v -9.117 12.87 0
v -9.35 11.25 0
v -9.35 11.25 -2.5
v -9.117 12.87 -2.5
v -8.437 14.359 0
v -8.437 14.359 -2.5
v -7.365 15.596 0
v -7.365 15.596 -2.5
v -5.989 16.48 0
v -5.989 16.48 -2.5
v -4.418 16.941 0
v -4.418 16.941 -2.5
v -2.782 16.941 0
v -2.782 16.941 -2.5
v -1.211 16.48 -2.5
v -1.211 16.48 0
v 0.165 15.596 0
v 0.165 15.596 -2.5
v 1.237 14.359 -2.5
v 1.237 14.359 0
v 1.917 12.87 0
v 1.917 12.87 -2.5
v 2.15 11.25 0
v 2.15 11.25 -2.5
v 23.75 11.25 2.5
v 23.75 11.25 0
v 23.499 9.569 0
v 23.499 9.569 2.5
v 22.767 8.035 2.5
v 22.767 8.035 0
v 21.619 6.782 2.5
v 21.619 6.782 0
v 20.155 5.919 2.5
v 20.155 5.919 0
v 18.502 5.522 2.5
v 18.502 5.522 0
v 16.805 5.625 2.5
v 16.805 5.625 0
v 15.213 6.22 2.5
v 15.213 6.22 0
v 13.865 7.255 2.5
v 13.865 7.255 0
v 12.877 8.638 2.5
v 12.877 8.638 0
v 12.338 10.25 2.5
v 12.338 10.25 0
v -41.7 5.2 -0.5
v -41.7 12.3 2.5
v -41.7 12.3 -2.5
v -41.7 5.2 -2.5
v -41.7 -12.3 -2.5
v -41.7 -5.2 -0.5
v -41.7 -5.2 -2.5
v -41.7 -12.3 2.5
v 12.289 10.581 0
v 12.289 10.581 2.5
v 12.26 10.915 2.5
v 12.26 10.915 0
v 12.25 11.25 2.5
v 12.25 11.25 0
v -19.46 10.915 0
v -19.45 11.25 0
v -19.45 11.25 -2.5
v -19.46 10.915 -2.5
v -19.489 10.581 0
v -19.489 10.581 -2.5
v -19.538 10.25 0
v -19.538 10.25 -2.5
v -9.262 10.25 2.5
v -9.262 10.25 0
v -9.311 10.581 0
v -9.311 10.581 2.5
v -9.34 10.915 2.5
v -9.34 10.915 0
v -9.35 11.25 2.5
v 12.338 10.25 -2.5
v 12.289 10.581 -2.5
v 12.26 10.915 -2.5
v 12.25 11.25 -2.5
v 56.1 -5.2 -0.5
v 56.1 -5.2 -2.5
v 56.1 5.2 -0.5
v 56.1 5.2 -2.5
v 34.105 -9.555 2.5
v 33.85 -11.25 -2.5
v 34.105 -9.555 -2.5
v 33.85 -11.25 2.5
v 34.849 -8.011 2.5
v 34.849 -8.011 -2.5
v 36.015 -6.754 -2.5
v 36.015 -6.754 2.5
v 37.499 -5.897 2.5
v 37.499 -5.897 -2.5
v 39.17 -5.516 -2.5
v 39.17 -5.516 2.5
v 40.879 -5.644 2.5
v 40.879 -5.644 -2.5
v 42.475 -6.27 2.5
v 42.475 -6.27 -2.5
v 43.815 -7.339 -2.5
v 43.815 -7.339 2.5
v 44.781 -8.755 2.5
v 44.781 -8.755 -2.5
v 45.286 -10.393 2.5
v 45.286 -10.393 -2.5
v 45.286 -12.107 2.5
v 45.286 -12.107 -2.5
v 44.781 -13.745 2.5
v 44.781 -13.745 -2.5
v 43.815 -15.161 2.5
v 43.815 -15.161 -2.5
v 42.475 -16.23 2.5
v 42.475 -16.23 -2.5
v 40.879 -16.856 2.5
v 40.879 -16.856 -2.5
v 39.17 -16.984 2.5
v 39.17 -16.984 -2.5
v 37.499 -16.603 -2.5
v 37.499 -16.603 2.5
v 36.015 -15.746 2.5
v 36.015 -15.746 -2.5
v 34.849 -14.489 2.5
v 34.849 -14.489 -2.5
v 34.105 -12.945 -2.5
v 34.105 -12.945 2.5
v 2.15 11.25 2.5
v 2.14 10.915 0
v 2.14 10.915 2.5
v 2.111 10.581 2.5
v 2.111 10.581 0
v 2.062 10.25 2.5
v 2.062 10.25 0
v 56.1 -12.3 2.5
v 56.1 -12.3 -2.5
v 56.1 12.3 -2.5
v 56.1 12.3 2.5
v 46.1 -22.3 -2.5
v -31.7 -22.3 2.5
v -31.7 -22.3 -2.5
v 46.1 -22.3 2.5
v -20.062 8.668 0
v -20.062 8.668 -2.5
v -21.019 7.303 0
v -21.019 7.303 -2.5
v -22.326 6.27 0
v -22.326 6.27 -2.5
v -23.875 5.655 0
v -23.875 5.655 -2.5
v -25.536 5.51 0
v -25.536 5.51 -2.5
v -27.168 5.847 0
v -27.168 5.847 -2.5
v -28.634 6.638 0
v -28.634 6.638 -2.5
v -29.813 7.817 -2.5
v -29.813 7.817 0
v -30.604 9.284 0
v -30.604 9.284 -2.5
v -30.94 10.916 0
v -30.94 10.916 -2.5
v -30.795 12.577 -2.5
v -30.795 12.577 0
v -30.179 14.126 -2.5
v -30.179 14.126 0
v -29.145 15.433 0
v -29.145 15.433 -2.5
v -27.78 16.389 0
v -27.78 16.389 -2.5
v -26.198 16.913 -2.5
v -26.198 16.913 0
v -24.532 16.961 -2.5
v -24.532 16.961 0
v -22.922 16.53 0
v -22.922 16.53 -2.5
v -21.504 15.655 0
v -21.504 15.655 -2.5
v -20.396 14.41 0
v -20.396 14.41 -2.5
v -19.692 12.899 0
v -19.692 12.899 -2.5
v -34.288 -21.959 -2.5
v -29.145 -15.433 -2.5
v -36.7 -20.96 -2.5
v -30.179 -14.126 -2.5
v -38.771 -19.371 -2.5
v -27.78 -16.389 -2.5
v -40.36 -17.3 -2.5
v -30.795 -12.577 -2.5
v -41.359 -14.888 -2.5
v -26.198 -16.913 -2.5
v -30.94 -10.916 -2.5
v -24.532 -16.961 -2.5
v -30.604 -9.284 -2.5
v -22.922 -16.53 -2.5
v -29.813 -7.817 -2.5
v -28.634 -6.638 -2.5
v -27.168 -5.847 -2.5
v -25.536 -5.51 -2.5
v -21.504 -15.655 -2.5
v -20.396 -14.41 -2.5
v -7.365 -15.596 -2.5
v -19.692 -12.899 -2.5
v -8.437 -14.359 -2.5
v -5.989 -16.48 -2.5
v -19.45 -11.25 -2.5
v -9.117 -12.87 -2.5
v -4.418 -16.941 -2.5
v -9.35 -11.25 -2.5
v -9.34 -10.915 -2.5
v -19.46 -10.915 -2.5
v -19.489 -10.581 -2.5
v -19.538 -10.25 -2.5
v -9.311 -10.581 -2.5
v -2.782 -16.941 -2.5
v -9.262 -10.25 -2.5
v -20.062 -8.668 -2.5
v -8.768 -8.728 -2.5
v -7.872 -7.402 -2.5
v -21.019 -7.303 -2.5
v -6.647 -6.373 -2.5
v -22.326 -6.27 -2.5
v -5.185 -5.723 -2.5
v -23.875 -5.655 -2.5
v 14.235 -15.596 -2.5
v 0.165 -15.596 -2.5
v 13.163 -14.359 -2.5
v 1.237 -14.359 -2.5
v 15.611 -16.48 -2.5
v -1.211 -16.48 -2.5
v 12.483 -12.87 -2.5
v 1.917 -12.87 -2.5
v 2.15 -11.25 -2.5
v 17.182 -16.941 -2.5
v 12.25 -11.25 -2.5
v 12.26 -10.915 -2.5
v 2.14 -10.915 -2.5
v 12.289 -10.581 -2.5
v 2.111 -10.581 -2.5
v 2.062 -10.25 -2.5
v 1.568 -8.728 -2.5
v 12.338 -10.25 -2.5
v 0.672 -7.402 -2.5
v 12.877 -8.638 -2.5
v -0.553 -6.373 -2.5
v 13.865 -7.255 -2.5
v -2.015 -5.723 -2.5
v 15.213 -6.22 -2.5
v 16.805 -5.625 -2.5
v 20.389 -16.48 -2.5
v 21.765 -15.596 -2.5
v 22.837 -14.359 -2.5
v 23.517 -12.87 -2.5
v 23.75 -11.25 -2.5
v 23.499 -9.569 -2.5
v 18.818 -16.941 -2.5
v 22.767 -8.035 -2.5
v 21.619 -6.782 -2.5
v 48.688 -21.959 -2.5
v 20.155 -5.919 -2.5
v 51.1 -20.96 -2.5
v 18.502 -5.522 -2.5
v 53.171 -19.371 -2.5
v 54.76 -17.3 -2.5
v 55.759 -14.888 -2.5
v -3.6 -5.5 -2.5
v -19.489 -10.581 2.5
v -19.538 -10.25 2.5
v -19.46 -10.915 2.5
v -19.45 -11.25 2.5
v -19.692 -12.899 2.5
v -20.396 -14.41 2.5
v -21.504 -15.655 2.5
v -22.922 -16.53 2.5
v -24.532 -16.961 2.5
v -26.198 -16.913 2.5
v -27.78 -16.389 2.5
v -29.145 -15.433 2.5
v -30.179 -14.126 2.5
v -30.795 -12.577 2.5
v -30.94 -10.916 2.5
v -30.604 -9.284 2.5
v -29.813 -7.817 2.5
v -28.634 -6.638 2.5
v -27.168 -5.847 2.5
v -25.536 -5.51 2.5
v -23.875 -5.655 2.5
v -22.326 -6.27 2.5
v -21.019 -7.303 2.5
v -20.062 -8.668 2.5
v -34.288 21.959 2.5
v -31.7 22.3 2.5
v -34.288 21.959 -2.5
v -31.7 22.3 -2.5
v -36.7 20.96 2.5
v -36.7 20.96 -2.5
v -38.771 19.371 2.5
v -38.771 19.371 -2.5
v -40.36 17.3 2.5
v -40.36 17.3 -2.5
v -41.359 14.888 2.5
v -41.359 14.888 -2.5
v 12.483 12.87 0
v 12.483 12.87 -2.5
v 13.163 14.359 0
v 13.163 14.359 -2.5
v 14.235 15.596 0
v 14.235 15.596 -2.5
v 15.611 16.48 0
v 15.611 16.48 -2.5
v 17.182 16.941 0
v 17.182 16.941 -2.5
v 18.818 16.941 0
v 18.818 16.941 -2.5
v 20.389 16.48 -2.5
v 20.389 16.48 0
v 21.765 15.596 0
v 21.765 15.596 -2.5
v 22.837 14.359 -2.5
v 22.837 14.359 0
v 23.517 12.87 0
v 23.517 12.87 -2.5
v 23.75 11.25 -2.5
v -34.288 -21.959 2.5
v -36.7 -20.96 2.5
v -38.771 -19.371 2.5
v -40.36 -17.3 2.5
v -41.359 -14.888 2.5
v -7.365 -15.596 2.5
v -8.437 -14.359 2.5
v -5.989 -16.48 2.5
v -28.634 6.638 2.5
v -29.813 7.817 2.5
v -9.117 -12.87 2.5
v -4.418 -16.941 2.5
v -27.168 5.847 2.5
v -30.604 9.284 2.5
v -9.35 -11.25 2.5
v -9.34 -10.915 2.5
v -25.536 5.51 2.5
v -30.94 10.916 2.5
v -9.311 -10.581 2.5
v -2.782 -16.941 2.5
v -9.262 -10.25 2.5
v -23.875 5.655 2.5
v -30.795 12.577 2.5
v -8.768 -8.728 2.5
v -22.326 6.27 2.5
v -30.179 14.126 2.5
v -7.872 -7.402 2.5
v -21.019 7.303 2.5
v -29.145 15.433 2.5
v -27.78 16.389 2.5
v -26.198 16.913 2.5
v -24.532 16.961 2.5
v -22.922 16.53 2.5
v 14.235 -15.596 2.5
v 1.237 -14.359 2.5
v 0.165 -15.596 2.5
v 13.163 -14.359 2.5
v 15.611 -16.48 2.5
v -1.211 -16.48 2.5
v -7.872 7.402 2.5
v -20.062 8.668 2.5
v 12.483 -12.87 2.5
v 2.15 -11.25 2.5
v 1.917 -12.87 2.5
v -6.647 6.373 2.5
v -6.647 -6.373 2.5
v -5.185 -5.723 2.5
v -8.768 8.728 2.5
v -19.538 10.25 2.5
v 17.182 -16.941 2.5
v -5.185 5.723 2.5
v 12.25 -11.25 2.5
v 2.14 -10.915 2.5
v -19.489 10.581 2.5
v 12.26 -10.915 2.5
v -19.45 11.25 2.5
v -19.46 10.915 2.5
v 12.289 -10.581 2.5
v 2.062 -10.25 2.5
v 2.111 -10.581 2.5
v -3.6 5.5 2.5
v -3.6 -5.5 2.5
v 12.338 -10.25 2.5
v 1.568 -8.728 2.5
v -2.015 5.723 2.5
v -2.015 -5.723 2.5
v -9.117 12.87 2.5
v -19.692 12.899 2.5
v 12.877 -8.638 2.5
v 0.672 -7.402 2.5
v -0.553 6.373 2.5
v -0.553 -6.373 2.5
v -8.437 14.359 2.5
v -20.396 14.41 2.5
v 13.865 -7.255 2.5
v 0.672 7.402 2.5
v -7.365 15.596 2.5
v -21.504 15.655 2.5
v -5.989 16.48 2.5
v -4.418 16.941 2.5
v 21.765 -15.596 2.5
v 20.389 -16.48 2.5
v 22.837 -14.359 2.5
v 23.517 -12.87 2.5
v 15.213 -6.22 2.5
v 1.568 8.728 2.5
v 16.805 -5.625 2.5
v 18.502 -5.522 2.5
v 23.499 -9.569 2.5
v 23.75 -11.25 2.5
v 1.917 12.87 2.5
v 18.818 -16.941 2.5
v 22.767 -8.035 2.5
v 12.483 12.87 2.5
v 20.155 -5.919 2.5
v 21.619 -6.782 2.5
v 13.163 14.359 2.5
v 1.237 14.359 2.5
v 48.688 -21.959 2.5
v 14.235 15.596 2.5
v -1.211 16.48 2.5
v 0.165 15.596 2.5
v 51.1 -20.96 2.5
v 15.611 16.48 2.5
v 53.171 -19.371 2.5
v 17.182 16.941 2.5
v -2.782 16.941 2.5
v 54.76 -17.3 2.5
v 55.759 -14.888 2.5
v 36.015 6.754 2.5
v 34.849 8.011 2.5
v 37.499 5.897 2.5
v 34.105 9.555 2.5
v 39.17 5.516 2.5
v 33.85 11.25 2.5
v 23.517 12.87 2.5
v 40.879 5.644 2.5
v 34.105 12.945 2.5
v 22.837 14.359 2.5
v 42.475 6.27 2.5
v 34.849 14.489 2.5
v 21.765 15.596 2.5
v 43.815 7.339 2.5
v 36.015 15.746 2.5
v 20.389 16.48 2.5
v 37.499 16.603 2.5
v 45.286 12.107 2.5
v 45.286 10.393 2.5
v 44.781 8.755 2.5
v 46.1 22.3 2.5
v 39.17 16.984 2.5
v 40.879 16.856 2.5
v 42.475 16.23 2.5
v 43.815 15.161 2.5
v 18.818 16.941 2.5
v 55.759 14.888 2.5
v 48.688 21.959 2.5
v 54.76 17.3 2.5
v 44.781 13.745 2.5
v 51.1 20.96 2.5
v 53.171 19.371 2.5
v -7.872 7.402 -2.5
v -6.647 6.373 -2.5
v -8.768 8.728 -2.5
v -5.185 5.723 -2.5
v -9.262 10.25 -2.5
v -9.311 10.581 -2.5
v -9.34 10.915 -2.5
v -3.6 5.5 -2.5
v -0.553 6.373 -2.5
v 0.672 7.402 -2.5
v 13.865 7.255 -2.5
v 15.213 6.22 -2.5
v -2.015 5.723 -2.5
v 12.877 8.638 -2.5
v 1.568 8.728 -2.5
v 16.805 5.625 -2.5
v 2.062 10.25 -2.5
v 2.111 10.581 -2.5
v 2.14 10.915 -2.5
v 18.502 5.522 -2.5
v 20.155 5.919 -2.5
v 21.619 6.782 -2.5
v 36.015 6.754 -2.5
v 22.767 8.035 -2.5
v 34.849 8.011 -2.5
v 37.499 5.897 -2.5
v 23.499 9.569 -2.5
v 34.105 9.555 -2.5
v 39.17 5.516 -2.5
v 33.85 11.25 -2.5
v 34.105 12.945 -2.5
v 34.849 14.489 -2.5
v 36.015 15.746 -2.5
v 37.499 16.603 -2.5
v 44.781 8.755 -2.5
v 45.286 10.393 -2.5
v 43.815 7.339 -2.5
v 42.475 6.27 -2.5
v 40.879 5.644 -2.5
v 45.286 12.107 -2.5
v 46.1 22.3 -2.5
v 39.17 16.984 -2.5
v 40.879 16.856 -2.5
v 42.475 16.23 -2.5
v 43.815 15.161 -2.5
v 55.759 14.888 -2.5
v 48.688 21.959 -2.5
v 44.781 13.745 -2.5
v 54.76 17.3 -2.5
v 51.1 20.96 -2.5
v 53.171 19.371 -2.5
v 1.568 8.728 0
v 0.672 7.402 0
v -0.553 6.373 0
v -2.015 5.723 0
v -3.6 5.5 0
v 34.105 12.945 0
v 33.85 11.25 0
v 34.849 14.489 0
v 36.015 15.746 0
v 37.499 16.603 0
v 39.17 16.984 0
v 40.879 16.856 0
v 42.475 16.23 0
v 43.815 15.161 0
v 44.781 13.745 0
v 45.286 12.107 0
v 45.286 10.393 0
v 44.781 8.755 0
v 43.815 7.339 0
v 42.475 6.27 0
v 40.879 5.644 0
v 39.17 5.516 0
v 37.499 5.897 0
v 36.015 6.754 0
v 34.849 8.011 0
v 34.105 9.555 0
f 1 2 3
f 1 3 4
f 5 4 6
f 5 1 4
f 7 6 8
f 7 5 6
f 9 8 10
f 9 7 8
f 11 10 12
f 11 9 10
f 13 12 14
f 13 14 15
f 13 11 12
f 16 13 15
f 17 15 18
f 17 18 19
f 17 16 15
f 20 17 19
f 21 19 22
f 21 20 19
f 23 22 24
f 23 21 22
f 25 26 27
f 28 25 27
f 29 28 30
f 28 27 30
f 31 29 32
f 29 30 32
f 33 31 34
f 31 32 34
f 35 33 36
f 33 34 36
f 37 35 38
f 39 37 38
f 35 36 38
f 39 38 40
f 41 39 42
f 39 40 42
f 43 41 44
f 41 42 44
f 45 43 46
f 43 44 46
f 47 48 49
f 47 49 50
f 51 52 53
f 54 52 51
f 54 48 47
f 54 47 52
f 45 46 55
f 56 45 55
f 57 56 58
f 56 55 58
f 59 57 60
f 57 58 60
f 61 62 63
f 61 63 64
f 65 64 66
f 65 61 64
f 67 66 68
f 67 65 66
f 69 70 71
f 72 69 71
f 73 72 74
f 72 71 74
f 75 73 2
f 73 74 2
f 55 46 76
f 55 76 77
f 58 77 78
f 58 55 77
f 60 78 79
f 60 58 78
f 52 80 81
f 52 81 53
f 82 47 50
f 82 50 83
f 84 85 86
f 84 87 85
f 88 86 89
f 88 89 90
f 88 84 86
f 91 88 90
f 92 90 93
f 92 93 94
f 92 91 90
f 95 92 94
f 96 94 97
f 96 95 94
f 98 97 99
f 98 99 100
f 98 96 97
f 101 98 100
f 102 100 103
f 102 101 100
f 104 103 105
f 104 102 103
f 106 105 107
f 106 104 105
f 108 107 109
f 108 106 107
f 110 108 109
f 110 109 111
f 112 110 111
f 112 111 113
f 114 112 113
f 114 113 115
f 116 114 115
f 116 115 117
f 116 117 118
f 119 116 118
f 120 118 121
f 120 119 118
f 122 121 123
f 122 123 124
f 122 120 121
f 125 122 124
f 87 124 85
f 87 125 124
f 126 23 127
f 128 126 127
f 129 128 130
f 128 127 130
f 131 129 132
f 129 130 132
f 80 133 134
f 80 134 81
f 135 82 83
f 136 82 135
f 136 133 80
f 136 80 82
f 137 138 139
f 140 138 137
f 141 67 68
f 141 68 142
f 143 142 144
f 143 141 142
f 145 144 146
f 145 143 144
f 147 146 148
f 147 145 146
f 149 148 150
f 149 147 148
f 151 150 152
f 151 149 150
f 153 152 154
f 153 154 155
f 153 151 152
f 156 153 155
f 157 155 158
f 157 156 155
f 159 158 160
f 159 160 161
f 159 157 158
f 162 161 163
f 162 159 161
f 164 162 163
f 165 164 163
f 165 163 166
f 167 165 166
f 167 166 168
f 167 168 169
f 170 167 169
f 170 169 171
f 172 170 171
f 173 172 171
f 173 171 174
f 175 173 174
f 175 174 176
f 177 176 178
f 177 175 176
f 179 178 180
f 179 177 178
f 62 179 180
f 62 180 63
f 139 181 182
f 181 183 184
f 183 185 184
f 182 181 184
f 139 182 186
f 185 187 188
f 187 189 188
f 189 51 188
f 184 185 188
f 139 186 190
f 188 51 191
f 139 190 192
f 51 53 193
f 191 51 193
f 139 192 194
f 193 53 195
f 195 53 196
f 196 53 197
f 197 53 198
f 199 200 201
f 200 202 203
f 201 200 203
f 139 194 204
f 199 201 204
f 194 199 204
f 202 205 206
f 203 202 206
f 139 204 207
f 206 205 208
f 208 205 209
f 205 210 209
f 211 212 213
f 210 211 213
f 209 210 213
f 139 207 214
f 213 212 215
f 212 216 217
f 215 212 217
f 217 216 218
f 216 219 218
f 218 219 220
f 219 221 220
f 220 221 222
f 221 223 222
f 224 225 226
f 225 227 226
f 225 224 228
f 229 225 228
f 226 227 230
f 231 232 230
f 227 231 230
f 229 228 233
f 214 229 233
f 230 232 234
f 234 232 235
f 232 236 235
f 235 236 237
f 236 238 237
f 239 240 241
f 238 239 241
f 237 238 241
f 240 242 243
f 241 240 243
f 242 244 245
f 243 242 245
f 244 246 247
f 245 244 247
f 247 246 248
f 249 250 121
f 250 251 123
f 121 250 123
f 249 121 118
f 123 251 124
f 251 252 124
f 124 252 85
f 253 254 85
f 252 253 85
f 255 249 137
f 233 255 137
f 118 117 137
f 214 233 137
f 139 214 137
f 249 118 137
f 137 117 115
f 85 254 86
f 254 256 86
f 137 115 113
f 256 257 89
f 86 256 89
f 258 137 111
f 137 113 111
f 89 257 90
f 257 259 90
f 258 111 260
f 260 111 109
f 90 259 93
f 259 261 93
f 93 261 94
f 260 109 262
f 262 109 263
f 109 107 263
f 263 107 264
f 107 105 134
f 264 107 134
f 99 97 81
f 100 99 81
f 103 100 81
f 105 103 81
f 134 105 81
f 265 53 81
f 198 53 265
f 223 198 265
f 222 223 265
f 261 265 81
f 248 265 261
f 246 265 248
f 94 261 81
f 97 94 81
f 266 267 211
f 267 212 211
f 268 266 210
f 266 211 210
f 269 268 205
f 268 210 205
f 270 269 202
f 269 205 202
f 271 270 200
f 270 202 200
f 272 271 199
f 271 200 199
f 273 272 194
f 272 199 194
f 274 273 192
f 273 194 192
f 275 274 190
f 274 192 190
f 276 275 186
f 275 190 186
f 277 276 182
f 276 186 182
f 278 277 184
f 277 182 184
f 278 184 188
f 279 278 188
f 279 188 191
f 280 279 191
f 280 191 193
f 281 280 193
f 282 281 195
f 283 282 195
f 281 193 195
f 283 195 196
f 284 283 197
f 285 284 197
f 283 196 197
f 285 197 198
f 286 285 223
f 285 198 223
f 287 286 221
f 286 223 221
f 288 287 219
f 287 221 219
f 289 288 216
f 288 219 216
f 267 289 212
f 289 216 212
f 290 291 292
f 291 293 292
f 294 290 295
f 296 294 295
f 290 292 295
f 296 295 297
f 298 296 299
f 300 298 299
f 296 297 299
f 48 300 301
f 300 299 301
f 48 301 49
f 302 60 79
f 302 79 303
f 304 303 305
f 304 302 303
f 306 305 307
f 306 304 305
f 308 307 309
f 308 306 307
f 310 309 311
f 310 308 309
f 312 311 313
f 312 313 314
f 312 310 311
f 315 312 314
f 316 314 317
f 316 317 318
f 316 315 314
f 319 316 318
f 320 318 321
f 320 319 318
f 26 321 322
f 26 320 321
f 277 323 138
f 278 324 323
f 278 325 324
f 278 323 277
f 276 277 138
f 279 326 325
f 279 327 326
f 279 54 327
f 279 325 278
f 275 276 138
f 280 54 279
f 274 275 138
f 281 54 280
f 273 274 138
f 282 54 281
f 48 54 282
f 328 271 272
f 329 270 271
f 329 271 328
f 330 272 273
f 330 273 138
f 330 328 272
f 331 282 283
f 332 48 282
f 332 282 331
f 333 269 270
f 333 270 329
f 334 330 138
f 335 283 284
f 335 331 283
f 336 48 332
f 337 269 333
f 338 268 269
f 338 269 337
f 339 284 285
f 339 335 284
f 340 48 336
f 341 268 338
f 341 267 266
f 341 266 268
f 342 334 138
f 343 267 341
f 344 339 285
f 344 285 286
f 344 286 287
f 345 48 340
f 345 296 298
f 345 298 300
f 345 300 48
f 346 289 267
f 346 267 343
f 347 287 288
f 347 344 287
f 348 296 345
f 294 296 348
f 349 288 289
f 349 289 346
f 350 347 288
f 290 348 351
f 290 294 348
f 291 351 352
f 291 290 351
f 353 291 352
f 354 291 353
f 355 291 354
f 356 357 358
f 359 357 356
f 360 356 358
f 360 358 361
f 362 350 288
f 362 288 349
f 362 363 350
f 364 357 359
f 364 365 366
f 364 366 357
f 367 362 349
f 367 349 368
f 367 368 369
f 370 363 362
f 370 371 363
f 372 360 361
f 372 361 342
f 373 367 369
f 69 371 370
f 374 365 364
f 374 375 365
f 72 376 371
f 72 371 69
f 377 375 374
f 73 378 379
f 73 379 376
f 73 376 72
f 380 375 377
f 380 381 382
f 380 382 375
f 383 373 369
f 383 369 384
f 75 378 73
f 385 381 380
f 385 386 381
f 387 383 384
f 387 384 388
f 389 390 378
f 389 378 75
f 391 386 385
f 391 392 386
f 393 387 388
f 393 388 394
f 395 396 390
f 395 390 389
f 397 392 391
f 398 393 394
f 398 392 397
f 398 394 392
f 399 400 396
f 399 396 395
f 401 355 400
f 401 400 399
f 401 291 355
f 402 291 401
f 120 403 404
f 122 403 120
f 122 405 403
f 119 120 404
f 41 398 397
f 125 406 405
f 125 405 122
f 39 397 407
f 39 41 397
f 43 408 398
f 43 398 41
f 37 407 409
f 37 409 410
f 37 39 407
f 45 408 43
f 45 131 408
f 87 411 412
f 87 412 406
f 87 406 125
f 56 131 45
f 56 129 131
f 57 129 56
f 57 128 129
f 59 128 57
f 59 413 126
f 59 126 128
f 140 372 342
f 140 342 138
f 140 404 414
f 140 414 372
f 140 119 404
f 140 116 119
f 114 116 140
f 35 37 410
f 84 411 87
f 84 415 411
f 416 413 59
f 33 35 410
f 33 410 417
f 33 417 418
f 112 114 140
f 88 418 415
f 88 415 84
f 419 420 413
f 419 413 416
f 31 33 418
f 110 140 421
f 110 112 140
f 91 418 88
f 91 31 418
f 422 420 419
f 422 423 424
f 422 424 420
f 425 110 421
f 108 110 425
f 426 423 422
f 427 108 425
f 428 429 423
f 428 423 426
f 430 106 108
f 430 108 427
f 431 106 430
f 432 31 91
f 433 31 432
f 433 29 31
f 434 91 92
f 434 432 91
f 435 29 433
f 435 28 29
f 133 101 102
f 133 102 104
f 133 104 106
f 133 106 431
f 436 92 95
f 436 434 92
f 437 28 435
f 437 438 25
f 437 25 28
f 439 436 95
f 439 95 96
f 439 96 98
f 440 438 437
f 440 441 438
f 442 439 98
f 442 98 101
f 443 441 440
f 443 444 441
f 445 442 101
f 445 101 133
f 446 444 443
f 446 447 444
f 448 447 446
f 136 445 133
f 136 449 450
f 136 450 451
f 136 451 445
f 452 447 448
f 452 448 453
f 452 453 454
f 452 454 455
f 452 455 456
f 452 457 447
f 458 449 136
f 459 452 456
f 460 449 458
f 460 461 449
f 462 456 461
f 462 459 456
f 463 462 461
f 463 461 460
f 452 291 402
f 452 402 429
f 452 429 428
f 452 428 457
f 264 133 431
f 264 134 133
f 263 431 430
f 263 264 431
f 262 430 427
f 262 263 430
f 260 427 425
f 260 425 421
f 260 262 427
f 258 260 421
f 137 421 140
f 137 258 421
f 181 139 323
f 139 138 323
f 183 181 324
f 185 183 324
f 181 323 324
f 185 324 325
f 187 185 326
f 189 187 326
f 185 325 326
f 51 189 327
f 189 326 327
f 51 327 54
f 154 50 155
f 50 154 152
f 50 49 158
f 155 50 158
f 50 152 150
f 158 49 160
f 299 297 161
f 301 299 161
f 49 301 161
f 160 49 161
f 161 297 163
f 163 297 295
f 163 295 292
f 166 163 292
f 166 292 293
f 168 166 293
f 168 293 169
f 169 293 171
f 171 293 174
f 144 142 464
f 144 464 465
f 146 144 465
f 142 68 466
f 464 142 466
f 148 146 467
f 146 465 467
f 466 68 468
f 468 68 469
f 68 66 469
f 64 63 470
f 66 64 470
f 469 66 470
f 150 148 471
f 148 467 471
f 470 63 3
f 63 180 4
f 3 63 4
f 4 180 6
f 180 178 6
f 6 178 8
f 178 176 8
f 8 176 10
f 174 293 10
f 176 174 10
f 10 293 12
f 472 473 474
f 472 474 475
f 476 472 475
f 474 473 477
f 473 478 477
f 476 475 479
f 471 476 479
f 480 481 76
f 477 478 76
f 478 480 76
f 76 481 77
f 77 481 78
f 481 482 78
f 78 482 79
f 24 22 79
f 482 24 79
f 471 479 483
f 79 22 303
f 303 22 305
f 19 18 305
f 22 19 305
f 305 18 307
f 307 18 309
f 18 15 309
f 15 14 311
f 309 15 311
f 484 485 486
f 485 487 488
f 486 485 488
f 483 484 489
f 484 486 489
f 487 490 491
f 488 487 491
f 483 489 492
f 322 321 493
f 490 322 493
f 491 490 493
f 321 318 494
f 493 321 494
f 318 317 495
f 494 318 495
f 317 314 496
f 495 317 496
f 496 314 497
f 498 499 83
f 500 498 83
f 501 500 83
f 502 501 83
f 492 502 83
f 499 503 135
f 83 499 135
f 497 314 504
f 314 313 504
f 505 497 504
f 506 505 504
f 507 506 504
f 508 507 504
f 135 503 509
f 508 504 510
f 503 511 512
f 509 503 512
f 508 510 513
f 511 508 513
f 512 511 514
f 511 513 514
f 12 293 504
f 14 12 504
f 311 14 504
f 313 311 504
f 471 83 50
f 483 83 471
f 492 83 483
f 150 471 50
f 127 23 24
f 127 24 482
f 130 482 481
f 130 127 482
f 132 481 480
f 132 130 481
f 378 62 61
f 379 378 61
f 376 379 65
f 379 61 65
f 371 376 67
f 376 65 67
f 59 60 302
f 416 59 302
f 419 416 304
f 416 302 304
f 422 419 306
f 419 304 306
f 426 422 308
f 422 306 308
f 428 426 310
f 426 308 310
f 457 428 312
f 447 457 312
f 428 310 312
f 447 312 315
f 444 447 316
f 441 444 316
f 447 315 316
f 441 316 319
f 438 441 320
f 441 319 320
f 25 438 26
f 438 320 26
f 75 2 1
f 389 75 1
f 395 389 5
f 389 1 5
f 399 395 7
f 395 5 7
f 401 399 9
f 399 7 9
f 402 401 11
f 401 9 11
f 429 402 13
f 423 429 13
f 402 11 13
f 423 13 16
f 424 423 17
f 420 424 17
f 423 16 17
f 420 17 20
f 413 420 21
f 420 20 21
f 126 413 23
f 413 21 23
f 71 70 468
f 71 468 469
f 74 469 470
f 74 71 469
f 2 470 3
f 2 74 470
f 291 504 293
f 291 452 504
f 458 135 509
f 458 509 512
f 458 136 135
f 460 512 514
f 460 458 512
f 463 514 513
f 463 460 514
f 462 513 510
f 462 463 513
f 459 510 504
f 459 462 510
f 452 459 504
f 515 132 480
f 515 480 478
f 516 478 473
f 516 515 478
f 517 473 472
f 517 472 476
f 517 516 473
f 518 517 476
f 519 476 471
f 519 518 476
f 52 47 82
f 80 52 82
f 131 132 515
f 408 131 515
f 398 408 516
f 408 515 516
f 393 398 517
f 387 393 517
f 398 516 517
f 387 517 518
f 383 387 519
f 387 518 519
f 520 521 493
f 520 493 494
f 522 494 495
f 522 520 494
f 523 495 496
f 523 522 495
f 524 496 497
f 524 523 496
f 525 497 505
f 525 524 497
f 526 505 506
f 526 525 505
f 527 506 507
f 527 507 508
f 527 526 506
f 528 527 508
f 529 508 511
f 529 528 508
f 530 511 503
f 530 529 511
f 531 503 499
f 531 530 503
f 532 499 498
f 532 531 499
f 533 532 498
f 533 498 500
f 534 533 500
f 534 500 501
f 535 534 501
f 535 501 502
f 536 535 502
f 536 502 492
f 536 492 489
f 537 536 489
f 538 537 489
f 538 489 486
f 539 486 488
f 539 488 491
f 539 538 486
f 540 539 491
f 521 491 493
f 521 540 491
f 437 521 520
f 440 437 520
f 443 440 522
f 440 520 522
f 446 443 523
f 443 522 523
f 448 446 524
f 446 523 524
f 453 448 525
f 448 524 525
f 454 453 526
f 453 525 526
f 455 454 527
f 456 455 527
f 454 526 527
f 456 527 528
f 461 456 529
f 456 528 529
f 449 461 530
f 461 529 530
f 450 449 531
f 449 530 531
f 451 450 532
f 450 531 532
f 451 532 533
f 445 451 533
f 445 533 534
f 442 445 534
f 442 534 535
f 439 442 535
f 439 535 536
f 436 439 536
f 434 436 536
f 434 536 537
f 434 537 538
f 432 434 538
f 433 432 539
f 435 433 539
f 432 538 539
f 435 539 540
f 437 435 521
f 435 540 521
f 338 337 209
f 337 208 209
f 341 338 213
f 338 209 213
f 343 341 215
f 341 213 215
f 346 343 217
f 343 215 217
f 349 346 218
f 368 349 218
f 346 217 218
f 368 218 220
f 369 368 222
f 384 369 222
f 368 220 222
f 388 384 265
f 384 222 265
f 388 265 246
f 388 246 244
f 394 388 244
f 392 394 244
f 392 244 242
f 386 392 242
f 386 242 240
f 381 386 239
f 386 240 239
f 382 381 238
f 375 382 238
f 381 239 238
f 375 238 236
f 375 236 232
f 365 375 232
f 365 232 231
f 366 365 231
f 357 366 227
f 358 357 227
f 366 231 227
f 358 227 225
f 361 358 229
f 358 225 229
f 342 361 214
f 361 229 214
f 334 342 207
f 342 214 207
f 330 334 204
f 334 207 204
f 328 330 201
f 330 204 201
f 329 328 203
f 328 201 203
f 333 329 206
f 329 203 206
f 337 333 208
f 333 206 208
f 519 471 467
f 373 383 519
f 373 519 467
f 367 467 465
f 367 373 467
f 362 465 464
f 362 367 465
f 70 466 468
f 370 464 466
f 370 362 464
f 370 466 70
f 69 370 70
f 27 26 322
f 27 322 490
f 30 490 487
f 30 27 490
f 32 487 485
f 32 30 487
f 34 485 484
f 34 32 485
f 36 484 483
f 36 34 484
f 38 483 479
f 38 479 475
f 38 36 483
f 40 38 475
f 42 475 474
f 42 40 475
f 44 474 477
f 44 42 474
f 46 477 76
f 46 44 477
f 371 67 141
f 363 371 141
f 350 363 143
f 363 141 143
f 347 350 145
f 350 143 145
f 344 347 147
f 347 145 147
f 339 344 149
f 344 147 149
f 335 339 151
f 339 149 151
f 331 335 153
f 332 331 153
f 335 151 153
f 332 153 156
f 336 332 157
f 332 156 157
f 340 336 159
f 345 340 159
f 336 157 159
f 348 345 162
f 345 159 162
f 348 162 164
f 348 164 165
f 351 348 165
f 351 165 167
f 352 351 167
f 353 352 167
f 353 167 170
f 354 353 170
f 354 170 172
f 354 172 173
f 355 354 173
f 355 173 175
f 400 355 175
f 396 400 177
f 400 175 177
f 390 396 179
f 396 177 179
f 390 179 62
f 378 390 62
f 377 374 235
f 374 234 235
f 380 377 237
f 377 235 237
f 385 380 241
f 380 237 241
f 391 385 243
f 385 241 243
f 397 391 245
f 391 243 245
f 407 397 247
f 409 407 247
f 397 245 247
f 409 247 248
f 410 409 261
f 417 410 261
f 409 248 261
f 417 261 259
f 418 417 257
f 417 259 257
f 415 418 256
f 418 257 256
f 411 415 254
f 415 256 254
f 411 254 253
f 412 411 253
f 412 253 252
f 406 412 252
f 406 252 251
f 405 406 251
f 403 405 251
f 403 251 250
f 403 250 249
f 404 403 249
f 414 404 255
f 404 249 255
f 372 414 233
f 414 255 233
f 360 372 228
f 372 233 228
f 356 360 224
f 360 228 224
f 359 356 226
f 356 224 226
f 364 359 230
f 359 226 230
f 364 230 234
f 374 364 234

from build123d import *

# Parameters (mm, degrees)
F1_DEPTH = 2.5
F2_DEPTH = 2.5
F3_DEPTH = 0.5
F4_R     = 10


# Not quite as in the source:
# - a feature names something its author has since deleted; it is built from what else it names


with BuildPart() as f1:
    # F0 (on Top) → F1 (new body, symmetric)
    with BuildSketch(Plane.XY):
        with BuildLine():
            Line((-41.7, 5.2), (-3.6, 5.2))
            Line((-3.6, 5.2), (-3.6, 5.5))
            ThreePointArc((-3.6, 5.5), (-7.2954363748, 6.8447474533), (-9.2623758265, 10.25))
            Line((-9.2623758265, 10.25), (-19.5376241735, 10.25))
            ThreePointArc((-19.5376241735, 10.25), (-30.9280520686, 11.7519158285), (-19.45, 11.25))
            Line((-19.45, 11.25), (-9.35, 11.25))
            ThreePointArc((-9.35, 11.25), (-3.6, 17), (2.15, 11.25))
            Line((2.15, 11.25), (7.2, 11.25))
            Line((7.2, 11.25), (12.25, 11.25))
            ThreePointArc((12.25, 11.25), (18, 17), (23.75, 11.25))
            ThreePointArc((23.75, 11.25), (18.5019158285, 5.5219479314), (12.3376241735, 10.25))
            Line((12.3376241735, 10.25), (7.2, 10.25))
            Line((7.2, 10.25), (7.2, 5.2))
            Line((7.2, 5.2), (56.1, 5.2))
            Line((56.1, 5.2), (56.1, 22.3))
            Line((56.1, 22.3), (-41.7, 22.3))
            Line((-41.7, 22.3), (-41.7, 5.2))
        make_face()
        with BuildLine():
            ThreePointArc((45.35, 11.25), (39.6, 5.5), (33.85, 11.25))
            ThreePointArc((33.85, 11.25), (39.6, 17), (45.35, 11.25))
        make_face(mode=Mode.SUBTRACT)
        with BuildLine():
            Line((-3.6, 5.5), (-3.6, 5.2))
            Line((-3.6, 5.2), (7.2, 5.2))
            Line((7.2, 5.2), (7.2, 10.25))
            Line((7.2, 10.25), (2.0623758265, 10.25))
            ThreePointArc((2.0623758265, 10.25), (0.0954363748, 6.8447474533), (-3.6, 5.5))
        make_face()
        with BuildLine():
            Line((-19.5376241735, 10.25), (-9.2623758265, 10.25))
            ThreePointArc((-9.2623758265, 10.25), (-9.3280520686, 10.7480841715), (-9.35, 11.25))
            Line((-9.35, 11.25), (-19.45, 11.25))
            ThreePointArc((-19.45, 11.25), (-19.4719479314, 10.7480841715), (-19.5376241735, 10.25))
        make_face()
        with BuildLine():
            ThreePointArc((2.15, 11.25), (2.1280520686, 10.7480841715), (2.0623758265, 10.25))
            Line((2.0623758265, 10.25), (7.2, 10.25))
            Line((7.2, 10.25), (7.2, 11.25))
            Line((7.2, 11.25), (2.15, 11.25))
        make_face()
        with BuildLine():
            Line((7.2, 11.25), (7.2, 10.25))
            Line((7.2, 10.25), (12.3376241735, 10.25))
            ThreePointArc((12.3376241735, 10.25), (12.2719479314, 10.7480841715), (12.25, 11.25))
            Line((12.25, 11.25), (7.2, 11.25))
        make_face()
    extrude(amount=F1_DEPTH, both=True)



with BuildPart() as f1b:
    # F0 (on Top) → F1, piece 2 (new body, symmetric)
    with BuildSketch(Plane.XY):
        Polygon((56.1, -5.2), (-3.6, -5.2), (-41.7, -5.2), (-41.7, -22.3), (56.1, -22.3), align=None)
        with BuildLine():
            ThreePointArc((-9.2623758265, -10.25), (-7.2954363748, -6.8447474533), (-3.6, -5.5))
            ThreePointArc((-3.6, -5.5), (0.0954363748, -6.8447474533), (2.0623758265, -10.25))
            Line((2.0623758265, -10.25), (12.3376241735, -10.25))
            ThreePointArc((12.3376241735, -10.25), (18.5019158285, -5.5219479314), (23.75, -11.25))
            ThreePointArc((23.75, -11.25), (18, -17), (12.25, -11.25))
            Line((12.25, -11.25), (2.15, -11.25))
            ThreePointArc((2.15, -11.25), (-3.6, -17), (-9.35, -11.25))
            Line((-9.35, -11.25), (-19.45, -11.25))
            ThreePointArc((-19.45, -11.25), (-30.9280520686, -11.7519158285), (-19.5376241735, -10.25))
            Line((-19.5376241735, -10.25), (-9.2623758265, -10.25))
        make_face(mode=Mode.SUBTRACT)
        with BuildLine():
            ThreePointArc((45.35, -11.25), (39.6, -17), (33.85, -11.25))
            ThreePointArc((33.85, -11.25), (39.6, -5.5), (45.35, -11.25))
        make_face(mode=Mode.SUBTRACT)
        with BuildLine():
            Line((12.3376241735, -10.25), (2.0623758265, -10.25))
            ThreePointArc((2.0623758265, -10.25), (2.1280520686, -10.7480841715), (2.15, -11.25))
            Line((2.15, -11.25), (12.25, -11.25))
            ThreePointArc((12.25, -11.25), (12.2719479314, -10.7480841715), (12.3376241735, -10.25))
        make_face()
        with BuildLine():
            ThreePointArc((-9.35, -11.25), (-9.3280520686, -10.7480841715), (-9.2623758265, -10.25))
            Line((-9.2623758265, -10.25), (-19.5376241735, -10.25))
            ThreePointArc((-19.5376241735, -10.25), (-19.4719479314, -10.7480841715), (-19.45, -11.25))
            Line((-19.45, -11.25), (-9.35, -11.25))
        make_face()
    extrude(amount=F1_DEPTH, both=True)


with BuildPart() as f1_1:
    add(f1.part)

    add(f1b.part)  # F2 merges F1b
    # F0 (on Top) → F2 (join)
    with BuildSketch(Plane.XY):
        Polygon((-3.6, -5.2), (-3.6, 0), (-3.6, 5.2), (-41.7, 5.2), (-41.7, -5.2), align=None)
        Polygon((-3.6, 5.2), (-3.6, 0), (-3.6, -5.2), (56.1, -5.2), (56.1, 0), (56.1, 5.2), (7.2, 5.2), align=None)
    extrude(amount=F2_DEPTH)

    # F0 (on Top) → F3 (join)
    with BuildSketch(Plane.XY):
        Polygon((-3.6, 5.2), (-3.6, 0), (-3.6, -5.2), (56.1, -5.2), (56.1, 0), (56.1, 5.2), (7.2, 5.2), align=None)
        Polygon((-3.6, -5.2), (-3.6, 0), (-3.6, 5.2), (-41.7, 5.2), (-41.7, -5.2), align=None)
    extrude(amount=-F3_DEPTH)

    # F4
    f4_edges = [f1_1.edges().sort_by_distance(p)[0] for p in [
        (56.1, -22.3, 0),
        (-41.7, -22.3, 0),
        (-41.7, 22.3, 0),
        (56.1, 22.3, 0),
    ]]
    fillet(f4_edges, radius=F4_R)


solid = f1_1.part
